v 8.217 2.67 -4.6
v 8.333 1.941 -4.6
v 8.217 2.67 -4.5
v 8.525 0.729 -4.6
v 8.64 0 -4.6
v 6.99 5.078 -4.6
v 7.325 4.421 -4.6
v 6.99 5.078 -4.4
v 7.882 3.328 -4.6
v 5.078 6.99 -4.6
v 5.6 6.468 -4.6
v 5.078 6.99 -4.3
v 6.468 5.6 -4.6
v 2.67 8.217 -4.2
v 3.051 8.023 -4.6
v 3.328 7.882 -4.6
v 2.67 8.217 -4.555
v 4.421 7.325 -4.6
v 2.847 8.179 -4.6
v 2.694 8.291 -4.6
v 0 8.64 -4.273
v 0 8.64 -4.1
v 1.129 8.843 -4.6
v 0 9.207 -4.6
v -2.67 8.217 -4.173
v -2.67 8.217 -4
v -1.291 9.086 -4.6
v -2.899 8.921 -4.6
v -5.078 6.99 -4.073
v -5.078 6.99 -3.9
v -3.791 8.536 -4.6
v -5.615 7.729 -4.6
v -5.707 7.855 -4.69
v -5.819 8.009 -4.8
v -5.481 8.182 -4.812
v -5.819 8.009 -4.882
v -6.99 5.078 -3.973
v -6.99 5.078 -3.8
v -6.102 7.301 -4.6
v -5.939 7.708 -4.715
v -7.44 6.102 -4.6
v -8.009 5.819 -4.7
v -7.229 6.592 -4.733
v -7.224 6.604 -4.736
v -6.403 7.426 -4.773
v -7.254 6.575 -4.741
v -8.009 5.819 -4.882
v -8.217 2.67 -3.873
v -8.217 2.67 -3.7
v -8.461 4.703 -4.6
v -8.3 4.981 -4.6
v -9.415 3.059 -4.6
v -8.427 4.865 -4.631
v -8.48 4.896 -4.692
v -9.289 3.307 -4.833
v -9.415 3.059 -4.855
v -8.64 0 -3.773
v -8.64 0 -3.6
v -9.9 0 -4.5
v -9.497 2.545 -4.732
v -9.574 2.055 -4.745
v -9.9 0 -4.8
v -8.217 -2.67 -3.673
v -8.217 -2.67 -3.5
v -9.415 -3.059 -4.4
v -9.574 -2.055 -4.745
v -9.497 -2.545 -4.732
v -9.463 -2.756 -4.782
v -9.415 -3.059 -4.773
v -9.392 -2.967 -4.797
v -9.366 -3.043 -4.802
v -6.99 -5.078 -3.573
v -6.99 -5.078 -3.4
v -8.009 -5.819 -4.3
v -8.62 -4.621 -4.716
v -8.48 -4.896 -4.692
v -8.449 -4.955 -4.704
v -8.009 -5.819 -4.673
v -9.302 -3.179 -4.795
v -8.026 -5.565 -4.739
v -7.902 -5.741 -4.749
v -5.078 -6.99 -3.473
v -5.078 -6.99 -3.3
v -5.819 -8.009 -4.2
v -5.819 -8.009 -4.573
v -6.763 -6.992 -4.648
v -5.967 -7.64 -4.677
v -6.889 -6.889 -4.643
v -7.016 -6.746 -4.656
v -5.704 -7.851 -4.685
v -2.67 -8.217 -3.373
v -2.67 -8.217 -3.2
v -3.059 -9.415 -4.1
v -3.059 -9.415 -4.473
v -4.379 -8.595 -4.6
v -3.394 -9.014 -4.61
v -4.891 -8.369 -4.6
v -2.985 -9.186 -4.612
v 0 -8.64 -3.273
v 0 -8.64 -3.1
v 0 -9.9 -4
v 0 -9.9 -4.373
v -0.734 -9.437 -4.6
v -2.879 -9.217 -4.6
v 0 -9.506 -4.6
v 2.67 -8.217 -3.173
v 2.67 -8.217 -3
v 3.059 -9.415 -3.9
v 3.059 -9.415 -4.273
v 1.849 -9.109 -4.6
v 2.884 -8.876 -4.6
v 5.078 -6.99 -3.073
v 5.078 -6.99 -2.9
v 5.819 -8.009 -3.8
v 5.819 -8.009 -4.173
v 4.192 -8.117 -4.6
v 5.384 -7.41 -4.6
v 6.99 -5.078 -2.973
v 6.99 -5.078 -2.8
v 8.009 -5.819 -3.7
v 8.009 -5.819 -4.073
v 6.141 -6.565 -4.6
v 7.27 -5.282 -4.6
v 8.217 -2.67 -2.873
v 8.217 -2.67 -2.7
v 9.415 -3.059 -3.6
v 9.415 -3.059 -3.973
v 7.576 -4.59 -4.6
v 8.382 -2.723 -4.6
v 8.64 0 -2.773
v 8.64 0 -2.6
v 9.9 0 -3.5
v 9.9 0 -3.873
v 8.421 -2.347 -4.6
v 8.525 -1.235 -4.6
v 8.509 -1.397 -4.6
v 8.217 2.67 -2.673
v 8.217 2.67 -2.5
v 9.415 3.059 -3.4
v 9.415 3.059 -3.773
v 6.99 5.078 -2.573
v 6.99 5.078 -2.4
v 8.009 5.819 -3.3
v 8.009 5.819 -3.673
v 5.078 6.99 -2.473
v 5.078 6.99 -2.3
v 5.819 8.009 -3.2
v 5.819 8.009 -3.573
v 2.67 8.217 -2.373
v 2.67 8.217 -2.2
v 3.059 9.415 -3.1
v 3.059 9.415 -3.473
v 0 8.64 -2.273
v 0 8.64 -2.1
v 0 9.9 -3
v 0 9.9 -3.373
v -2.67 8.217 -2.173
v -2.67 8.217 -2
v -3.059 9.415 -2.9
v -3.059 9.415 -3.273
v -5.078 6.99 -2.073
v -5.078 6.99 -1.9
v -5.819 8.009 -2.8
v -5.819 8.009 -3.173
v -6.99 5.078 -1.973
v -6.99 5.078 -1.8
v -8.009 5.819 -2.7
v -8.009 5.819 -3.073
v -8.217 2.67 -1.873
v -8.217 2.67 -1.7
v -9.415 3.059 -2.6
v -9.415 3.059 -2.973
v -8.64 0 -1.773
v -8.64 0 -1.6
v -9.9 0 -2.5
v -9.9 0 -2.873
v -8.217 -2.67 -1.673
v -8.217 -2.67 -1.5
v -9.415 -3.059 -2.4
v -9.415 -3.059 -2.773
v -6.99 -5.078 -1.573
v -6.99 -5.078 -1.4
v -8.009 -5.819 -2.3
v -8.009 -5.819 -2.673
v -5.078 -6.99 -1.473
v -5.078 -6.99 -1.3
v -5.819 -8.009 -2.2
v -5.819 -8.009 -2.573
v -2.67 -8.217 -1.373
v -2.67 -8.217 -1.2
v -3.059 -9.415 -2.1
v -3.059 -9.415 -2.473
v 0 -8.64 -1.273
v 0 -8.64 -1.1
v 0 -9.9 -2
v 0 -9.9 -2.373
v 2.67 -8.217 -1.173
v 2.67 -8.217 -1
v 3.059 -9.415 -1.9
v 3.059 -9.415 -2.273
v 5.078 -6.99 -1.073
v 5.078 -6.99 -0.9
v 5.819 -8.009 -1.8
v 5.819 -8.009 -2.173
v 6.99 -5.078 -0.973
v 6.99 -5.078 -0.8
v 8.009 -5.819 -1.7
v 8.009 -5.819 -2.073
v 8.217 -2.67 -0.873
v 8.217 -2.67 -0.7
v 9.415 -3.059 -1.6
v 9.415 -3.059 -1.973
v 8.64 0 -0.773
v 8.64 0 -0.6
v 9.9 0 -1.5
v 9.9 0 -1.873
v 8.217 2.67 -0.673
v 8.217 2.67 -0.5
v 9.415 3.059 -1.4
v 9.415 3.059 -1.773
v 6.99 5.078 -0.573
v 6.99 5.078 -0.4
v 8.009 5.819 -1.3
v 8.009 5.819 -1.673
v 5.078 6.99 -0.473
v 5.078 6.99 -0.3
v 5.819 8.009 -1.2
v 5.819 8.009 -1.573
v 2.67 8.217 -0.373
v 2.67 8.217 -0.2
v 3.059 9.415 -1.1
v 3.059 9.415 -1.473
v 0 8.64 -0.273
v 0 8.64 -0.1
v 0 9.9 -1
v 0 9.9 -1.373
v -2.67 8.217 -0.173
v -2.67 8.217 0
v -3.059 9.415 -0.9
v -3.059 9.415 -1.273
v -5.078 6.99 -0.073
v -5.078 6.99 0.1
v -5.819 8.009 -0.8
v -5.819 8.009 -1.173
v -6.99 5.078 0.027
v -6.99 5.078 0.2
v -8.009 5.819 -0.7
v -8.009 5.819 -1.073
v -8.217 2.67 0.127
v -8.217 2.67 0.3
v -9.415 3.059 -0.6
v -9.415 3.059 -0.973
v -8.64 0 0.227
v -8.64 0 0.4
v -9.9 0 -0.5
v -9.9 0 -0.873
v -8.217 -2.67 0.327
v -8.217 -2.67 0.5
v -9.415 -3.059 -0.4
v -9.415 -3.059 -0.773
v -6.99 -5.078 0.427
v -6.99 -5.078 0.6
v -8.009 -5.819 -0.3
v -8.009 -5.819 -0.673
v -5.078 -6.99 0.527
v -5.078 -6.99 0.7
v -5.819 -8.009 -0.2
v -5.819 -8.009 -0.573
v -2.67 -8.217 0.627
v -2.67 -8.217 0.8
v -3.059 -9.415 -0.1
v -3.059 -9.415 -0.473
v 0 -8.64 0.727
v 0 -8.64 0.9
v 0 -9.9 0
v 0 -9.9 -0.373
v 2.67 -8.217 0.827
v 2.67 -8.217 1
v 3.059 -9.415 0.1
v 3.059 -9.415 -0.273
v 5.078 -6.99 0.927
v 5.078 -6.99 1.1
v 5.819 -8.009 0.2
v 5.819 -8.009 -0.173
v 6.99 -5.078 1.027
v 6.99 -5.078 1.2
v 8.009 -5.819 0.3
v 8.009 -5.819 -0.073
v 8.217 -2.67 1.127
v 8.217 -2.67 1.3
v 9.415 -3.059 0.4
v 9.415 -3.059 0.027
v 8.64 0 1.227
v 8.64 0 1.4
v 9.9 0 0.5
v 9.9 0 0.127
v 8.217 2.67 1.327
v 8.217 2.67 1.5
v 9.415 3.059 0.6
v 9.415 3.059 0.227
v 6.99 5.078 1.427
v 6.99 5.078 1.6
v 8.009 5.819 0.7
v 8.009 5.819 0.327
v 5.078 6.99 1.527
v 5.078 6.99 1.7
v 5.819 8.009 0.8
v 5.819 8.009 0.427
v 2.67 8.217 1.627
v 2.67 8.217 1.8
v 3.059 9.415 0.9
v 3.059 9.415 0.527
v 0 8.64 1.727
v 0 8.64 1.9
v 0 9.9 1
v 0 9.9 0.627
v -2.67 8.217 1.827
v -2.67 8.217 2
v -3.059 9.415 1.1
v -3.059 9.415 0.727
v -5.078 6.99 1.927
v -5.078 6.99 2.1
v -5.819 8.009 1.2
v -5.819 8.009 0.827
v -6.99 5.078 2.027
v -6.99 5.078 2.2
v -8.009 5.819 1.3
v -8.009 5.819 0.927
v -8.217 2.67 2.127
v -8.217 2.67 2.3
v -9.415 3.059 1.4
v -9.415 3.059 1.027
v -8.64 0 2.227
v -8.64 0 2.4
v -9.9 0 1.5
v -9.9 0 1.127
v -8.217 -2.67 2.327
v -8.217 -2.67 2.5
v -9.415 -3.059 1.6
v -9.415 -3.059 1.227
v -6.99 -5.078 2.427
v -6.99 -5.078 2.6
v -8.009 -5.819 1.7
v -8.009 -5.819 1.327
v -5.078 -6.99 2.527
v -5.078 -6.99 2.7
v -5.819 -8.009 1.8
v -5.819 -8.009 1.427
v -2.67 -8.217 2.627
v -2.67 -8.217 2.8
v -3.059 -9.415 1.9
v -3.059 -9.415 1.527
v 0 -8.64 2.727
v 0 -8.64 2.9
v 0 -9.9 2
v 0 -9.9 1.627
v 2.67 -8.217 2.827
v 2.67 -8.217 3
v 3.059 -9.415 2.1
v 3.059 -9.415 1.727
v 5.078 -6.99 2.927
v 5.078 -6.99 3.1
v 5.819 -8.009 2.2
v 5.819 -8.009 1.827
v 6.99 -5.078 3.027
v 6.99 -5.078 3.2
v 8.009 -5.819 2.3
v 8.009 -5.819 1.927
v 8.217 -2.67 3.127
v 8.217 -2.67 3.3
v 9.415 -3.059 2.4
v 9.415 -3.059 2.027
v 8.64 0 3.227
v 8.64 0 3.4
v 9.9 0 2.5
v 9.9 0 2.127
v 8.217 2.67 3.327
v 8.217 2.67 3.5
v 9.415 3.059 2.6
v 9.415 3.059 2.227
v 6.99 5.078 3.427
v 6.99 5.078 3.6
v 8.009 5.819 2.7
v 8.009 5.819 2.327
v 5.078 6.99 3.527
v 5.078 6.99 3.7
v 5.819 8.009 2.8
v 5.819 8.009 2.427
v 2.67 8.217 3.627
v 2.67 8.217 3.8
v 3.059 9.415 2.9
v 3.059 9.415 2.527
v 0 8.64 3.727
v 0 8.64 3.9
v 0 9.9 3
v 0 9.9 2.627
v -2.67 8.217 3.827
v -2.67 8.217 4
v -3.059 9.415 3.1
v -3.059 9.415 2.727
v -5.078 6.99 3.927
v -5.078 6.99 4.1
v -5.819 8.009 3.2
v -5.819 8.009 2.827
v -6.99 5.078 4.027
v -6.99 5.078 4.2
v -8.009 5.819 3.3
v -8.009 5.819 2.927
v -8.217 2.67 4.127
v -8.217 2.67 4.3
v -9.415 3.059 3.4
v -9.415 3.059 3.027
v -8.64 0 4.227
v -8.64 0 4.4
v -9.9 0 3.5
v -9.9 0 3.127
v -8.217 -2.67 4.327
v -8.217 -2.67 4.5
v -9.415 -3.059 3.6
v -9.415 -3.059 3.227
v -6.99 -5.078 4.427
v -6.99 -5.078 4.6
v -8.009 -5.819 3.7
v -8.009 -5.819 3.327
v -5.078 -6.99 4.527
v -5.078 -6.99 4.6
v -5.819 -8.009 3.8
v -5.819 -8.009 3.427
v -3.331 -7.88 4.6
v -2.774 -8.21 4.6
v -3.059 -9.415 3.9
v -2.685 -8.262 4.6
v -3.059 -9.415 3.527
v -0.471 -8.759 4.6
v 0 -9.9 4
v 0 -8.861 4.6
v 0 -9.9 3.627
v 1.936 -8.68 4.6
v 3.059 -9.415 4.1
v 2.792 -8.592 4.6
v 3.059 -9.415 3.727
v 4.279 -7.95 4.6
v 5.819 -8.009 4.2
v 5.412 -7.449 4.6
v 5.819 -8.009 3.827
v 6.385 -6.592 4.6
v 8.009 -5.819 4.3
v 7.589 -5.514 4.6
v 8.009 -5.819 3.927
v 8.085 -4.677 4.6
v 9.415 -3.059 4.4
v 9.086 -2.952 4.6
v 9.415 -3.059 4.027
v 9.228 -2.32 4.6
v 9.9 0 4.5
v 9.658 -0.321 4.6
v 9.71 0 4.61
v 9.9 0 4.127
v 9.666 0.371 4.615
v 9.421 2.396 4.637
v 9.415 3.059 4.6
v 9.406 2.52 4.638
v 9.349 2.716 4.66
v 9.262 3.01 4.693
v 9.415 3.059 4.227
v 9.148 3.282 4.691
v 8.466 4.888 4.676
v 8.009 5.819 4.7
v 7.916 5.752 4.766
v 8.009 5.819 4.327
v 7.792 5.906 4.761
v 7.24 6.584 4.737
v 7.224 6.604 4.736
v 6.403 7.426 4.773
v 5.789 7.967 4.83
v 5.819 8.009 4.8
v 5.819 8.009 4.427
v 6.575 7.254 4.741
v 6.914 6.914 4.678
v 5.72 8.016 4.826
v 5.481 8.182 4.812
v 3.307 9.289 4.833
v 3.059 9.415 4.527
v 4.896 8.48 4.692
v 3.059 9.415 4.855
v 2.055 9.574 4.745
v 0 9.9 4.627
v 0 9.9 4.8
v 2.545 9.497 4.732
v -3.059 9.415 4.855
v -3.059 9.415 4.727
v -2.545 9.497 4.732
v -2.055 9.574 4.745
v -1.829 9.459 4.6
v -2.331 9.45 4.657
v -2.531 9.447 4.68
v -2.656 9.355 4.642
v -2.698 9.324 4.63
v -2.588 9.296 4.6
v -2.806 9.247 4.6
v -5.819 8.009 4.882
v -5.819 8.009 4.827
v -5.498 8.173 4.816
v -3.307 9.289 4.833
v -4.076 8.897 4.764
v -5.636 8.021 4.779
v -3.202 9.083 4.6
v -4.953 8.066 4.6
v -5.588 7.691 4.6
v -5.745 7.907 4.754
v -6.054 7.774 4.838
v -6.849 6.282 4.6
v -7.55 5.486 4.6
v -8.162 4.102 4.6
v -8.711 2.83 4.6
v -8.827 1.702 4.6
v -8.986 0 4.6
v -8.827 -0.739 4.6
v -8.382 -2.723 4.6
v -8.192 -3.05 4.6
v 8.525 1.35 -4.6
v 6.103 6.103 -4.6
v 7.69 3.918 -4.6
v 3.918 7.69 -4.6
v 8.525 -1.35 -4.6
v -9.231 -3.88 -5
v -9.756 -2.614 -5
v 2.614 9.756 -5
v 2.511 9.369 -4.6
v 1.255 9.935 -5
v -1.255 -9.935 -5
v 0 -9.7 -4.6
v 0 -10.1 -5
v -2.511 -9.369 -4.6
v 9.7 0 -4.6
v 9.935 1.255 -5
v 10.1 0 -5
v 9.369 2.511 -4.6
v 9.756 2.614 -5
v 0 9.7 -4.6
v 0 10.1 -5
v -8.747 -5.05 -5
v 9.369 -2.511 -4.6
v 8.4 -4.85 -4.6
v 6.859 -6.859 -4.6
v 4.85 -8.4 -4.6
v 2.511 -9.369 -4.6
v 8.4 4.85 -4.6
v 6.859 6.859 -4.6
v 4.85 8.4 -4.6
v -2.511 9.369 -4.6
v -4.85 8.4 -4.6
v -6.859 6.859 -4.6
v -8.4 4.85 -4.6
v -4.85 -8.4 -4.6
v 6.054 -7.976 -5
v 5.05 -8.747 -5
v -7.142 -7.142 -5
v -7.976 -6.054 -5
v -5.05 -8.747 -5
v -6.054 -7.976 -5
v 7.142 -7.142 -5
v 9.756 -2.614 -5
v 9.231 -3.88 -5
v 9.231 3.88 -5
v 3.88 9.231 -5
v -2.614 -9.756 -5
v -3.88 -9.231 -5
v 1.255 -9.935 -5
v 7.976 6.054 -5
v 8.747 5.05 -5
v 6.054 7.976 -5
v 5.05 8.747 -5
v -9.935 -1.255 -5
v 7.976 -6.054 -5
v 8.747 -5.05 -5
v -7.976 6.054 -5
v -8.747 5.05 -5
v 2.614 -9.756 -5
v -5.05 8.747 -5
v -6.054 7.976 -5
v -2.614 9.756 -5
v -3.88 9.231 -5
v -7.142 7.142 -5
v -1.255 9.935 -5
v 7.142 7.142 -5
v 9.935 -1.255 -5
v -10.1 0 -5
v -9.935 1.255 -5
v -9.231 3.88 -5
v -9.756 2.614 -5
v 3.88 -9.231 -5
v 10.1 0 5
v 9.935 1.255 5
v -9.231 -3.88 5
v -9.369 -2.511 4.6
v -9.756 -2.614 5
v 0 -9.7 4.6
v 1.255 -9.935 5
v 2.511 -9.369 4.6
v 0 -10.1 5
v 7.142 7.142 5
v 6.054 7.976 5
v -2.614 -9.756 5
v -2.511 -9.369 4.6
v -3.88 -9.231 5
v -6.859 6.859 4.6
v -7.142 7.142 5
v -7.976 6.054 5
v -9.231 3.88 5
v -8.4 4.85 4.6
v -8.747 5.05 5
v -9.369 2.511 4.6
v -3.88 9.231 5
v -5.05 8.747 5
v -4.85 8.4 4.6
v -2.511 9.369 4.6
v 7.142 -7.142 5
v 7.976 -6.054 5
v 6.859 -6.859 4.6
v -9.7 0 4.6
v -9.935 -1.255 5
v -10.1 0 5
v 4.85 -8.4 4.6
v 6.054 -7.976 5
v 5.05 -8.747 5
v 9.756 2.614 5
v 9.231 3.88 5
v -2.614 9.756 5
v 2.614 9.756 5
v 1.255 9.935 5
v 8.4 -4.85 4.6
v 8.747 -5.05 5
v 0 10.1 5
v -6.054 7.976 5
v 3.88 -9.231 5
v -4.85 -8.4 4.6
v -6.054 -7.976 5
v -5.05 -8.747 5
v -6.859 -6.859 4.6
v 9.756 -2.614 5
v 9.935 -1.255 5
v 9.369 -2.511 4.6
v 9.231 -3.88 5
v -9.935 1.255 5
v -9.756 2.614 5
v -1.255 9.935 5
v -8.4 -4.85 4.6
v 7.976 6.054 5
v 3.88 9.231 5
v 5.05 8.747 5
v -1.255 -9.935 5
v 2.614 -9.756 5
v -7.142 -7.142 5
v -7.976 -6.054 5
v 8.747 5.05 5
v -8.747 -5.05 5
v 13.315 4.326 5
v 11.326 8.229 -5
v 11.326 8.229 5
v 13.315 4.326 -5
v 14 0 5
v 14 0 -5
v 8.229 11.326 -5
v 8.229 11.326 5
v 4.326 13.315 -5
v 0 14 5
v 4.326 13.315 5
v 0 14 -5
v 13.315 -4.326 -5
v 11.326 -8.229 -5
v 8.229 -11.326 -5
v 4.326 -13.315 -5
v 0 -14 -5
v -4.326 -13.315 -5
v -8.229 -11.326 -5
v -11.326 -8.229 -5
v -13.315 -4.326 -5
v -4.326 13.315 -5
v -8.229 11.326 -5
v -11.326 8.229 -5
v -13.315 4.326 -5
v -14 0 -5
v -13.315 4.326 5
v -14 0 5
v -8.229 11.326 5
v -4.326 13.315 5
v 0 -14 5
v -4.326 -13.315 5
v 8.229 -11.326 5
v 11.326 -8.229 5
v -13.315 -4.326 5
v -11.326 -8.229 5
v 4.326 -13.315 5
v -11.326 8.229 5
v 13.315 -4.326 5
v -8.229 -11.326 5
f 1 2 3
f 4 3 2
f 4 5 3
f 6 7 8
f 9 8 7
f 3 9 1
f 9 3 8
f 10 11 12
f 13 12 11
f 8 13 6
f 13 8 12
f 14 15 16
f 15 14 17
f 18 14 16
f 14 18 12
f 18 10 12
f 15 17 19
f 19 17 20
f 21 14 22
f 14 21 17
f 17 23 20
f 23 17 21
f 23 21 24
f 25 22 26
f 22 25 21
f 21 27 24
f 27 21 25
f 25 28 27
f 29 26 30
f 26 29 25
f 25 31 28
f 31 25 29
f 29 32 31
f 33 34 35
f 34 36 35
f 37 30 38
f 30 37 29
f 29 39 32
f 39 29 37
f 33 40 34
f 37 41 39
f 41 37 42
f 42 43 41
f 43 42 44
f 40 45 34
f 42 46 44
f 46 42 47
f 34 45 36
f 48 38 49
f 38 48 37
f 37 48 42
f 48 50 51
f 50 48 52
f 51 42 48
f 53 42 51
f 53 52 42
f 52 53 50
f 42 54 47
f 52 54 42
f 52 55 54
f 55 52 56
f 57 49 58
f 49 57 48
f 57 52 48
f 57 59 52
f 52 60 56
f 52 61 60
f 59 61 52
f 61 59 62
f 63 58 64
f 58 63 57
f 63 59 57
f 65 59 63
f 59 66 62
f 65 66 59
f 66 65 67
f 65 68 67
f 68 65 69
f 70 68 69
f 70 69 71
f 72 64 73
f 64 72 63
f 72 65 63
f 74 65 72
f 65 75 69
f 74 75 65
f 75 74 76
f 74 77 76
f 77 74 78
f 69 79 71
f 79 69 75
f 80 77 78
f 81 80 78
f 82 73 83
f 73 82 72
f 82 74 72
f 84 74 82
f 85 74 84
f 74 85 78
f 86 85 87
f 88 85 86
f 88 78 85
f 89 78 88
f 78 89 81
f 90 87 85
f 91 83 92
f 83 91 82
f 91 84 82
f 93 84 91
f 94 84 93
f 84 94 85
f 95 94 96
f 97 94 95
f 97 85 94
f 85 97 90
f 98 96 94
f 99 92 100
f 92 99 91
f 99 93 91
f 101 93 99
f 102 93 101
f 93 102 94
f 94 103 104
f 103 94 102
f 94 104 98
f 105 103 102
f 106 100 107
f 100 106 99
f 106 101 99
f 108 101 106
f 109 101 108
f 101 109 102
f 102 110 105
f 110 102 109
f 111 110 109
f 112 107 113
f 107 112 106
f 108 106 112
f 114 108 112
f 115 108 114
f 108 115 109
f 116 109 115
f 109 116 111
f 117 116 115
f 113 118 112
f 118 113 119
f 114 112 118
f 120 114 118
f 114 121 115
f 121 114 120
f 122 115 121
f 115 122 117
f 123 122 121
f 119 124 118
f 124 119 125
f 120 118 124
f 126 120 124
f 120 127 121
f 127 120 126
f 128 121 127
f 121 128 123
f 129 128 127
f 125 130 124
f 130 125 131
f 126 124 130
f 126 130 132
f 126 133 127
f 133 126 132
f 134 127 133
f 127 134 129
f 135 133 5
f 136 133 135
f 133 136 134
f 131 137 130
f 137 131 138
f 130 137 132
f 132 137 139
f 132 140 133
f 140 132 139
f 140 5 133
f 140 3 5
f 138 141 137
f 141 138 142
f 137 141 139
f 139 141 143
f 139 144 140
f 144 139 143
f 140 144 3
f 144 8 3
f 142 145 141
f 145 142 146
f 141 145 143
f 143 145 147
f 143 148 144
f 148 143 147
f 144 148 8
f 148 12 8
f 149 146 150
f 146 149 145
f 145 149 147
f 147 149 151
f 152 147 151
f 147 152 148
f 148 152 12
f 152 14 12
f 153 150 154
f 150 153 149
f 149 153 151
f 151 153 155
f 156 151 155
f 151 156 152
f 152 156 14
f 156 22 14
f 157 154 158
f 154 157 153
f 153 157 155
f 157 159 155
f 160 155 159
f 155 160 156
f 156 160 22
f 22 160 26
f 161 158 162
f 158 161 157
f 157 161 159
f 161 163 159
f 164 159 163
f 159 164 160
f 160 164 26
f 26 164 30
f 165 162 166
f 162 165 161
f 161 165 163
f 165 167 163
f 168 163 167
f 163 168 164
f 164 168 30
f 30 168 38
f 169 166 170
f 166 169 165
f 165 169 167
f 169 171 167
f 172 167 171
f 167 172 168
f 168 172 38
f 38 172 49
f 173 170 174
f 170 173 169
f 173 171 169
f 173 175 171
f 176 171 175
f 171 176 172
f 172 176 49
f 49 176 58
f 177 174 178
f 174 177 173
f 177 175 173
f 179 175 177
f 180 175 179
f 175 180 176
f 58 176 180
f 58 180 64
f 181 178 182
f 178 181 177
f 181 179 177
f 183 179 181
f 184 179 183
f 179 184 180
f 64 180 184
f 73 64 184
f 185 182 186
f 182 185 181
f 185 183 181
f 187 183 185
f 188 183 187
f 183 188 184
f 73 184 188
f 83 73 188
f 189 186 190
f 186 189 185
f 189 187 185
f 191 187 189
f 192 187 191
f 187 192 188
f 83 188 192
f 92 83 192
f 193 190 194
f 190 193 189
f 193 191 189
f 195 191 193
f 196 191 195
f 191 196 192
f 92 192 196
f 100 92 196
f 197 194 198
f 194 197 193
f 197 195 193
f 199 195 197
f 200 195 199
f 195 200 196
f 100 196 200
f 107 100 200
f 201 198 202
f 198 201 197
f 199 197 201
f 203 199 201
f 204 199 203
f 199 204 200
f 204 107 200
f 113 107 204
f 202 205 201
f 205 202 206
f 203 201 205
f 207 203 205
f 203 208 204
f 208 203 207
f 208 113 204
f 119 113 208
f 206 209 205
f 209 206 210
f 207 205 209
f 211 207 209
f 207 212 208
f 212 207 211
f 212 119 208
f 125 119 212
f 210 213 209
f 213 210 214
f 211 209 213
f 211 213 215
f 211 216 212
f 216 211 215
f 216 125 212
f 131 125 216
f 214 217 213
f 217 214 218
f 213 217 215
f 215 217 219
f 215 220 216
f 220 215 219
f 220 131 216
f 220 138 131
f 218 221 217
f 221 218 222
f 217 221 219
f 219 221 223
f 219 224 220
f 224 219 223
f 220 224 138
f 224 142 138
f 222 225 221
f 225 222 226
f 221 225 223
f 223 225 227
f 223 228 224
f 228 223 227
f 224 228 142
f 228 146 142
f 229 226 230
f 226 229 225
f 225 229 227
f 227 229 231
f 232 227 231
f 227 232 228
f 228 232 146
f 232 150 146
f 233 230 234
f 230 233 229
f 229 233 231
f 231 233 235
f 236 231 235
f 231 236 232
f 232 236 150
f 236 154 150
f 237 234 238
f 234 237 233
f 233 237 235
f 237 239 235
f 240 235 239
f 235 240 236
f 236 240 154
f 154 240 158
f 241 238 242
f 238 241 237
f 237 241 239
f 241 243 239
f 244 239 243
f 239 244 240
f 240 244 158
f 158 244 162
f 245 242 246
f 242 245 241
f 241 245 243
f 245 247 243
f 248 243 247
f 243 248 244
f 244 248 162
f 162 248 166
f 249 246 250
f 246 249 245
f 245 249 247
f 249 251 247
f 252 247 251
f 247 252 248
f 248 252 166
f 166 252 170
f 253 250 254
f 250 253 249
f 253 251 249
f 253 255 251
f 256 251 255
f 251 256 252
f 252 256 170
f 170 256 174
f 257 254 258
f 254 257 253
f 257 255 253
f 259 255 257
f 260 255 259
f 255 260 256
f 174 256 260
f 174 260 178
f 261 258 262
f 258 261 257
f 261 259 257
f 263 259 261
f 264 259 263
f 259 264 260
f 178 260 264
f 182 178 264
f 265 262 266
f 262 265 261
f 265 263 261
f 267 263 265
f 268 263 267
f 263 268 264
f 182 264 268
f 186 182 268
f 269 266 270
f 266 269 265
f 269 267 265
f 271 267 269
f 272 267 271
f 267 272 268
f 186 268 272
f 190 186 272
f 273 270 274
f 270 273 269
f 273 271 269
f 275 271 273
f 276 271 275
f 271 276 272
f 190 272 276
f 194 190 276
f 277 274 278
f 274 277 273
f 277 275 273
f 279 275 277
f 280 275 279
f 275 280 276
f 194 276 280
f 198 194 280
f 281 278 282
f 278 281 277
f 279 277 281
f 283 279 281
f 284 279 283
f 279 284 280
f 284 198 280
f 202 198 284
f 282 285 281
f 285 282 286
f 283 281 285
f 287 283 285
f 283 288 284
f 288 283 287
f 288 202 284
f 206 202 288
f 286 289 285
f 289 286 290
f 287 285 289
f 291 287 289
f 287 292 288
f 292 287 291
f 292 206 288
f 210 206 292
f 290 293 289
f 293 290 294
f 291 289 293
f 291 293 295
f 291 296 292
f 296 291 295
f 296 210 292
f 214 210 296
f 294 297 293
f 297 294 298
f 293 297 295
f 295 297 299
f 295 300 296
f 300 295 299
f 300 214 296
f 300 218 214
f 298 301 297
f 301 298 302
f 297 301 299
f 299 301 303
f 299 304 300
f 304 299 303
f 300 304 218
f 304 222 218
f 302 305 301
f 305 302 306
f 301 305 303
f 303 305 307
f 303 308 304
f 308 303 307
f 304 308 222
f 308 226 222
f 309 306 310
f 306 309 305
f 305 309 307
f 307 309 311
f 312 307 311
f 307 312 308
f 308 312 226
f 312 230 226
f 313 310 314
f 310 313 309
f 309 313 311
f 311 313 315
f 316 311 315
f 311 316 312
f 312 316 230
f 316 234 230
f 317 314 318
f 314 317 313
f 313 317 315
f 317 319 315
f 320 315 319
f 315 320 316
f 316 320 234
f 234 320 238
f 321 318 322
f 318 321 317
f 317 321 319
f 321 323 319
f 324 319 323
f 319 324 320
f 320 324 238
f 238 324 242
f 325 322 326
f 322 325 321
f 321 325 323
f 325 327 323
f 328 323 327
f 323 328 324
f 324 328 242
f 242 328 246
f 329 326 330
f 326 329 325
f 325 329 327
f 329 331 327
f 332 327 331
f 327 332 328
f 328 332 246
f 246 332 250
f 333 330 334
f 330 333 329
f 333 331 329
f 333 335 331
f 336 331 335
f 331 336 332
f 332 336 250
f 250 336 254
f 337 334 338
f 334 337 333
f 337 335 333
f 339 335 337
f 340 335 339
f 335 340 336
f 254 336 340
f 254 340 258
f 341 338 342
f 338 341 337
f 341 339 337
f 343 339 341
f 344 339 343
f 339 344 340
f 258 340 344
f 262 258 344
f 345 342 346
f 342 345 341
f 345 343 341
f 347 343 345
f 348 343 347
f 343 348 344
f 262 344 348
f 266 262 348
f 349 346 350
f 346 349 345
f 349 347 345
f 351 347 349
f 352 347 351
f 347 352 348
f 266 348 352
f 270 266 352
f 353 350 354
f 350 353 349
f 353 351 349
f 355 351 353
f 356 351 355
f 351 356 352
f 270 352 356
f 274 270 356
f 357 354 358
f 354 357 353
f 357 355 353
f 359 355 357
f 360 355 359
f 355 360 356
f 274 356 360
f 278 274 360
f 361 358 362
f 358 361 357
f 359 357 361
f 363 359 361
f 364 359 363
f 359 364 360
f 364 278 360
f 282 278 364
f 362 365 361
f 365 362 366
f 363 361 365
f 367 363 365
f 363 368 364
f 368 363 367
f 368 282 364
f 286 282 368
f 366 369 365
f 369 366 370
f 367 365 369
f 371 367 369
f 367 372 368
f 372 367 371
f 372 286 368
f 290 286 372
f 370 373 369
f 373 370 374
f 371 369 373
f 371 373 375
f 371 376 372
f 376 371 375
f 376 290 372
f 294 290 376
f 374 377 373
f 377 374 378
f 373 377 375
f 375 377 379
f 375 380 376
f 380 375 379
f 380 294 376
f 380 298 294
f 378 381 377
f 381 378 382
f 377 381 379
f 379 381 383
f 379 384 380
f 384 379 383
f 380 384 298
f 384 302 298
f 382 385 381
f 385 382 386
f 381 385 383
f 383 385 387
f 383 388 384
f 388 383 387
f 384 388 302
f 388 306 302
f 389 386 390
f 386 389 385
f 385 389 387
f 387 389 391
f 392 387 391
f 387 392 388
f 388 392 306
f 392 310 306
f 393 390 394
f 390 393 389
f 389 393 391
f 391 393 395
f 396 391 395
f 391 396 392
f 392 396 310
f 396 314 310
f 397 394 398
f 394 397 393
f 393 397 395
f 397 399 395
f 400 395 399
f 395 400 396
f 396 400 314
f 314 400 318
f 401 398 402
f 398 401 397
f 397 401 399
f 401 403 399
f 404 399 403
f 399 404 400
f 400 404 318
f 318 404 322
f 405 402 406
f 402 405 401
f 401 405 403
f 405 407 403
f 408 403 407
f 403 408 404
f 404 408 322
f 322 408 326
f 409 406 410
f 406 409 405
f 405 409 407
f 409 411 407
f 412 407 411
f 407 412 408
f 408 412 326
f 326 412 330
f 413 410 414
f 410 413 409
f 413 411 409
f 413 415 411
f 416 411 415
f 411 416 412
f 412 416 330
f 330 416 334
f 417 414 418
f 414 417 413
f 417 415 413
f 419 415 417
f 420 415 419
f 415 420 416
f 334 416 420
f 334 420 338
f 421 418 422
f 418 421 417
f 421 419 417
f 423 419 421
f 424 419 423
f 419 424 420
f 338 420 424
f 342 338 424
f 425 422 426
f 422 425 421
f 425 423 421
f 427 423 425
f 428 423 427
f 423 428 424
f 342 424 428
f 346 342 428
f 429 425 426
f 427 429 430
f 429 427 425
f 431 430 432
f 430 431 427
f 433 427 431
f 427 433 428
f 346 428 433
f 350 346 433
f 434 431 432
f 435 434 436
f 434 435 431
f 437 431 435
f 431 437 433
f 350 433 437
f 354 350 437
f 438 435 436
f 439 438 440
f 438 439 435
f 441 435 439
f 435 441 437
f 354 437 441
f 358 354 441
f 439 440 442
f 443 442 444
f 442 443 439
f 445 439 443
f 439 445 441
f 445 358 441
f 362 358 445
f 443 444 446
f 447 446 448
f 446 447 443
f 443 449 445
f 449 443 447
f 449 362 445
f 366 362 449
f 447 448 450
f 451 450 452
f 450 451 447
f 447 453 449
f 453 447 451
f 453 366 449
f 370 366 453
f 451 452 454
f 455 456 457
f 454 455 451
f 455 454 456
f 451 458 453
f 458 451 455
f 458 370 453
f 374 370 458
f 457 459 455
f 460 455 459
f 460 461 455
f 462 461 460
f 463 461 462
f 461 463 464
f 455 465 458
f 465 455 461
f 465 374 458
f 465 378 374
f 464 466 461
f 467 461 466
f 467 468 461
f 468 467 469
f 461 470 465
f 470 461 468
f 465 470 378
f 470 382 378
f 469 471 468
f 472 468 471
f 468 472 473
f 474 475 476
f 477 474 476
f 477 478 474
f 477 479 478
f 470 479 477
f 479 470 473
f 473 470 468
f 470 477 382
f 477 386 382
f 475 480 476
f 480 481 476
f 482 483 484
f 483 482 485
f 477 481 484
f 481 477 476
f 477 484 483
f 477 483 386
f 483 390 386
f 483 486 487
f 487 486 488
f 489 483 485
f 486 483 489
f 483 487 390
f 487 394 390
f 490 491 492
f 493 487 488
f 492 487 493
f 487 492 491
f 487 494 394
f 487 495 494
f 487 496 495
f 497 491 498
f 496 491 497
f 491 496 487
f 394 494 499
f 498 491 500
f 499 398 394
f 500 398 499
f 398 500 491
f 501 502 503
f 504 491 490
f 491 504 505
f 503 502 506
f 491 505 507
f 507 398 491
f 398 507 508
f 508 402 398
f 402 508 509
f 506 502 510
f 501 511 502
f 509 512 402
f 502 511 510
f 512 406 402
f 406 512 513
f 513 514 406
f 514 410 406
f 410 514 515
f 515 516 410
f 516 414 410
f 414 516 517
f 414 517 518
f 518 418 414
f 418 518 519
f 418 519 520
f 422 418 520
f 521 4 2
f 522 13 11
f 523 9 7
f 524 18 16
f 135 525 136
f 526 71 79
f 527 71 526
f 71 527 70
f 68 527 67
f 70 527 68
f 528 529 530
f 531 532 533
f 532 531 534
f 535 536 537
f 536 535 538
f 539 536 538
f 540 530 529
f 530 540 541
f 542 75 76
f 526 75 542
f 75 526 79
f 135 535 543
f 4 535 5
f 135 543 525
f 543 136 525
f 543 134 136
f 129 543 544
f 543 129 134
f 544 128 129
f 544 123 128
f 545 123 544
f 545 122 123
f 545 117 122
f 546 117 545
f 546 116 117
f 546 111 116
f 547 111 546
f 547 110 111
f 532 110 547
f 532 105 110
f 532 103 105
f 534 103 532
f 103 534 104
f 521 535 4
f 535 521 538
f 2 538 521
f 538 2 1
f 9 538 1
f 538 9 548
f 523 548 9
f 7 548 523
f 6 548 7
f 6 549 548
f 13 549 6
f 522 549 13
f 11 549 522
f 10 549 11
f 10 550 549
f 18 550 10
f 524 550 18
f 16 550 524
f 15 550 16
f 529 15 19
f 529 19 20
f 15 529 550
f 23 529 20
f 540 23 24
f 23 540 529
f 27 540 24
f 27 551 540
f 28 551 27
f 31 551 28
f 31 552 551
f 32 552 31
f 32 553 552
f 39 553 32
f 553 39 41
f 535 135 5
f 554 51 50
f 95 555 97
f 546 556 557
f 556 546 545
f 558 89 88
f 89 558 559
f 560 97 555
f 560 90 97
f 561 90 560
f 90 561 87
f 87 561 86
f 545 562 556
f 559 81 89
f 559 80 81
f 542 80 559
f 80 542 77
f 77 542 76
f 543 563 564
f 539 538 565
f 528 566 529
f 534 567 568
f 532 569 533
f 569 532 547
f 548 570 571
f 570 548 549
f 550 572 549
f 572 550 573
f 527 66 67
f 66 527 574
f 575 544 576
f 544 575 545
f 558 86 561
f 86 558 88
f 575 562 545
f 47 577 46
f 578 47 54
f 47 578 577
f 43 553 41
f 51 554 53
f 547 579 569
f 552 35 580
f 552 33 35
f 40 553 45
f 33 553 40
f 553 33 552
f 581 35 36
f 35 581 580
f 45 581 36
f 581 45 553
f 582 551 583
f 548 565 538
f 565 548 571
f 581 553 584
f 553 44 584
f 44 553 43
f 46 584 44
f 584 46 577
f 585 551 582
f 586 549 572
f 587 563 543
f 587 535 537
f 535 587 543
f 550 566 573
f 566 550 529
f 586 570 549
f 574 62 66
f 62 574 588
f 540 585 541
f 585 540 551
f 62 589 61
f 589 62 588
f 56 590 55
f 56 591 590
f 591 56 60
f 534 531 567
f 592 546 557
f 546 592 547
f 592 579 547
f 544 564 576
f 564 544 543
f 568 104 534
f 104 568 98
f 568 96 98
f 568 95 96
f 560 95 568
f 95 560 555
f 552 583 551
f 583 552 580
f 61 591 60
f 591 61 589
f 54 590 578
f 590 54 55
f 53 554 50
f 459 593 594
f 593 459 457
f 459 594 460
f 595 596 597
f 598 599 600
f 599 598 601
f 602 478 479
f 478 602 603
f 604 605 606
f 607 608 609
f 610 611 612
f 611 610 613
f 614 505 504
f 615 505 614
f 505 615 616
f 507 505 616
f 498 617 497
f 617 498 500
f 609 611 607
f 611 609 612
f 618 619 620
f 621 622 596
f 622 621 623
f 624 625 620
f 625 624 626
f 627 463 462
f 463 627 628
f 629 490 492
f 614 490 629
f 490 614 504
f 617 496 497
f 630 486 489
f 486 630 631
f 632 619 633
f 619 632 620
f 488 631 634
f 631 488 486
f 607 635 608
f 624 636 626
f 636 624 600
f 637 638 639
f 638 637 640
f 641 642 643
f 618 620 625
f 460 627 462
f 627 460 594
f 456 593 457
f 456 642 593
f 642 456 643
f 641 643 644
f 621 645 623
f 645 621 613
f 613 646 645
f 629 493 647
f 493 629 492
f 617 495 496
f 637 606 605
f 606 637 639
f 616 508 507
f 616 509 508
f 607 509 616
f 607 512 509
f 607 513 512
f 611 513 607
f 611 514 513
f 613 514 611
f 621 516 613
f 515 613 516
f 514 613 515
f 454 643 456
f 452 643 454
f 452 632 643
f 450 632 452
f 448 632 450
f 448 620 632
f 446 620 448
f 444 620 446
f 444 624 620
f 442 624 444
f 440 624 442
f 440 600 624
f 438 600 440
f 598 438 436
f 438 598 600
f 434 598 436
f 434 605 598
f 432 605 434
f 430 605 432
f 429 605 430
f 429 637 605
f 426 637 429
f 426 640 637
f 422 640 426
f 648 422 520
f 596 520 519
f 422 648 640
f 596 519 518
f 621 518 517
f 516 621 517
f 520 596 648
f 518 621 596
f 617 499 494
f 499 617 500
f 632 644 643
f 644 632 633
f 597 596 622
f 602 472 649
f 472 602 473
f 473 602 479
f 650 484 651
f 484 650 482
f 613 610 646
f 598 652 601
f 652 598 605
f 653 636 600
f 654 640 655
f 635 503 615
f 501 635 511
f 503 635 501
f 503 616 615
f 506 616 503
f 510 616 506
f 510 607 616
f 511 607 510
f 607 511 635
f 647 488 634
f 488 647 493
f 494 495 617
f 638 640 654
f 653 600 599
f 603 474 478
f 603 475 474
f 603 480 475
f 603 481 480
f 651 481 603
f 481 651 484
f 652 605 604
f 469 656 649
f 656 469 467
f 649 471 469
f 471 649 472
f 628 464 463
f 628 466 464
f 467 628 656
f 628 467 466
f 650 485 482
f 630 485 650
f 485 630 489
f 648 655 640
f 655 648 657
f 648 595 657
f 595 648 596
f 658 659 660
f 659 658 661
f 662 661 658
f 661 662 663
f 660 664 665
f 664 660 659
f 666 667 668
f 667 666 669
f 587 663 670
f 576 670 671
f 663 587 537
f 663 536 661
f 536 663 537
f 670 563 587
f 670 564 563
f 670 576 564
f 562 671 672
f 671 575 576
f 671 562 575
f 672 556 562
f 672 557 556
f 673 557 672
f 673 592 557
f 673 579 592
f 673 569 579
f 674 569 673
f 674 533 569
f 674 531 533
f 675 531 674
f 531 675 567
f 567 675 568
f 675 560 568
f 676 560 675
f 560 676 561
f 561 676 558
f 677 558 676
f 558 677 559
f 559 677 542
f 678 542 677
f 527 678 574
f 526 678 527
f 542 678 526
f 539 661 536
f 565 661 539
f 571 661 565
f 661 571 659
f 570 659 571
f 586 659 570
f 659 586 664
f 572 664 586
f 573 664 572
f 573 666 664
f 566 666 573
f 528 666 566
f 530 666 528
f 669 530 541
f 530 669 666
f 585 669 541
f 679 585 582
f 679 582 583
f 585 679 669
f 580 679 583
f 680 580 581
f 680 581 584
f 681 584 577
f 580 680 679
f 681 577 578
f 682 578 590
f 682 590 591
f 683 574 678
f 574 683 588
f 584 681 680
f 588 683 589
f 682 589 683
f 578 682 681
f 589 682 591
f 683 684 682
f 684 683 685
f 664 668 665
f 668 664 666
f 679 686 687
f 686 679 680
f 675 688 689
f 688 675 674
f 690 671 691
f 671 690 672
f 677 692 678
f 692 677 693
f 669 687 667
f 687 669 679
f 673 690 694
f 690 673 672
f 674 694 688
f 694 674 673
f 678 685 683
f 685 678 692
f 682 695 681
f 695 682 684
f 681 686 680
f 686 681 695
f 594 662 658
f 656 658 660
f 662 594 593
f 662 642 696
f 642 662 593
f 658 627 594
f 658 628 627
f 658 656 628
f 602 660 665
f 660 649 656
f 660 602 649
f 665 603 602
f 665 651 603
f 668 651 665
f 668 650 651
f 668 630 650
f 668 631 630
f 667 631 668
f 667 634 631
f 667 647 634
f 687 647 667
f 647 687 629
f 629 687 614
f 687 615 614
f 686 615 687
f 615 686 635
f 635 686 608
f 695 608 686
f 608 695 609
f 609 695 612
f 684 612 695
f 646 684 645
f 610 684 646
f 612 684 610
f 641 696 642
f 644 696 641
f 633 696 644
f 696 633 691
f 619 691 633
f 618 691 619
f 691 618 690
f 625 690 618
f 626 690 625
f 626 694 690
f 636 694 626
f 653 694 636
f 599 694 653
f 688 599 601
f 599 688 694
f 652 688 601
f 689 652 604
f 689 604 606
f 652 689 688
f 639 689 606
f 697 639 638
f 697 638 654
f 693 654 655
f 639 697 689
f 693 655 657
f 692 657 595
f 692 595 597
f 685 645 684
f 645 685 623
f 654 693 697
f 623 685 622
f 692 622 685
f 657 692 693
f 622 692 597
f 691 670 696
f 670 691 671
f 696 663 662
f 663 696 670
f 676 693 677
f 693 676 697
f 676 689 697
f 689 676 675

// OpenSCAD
// A replacement holder to fit a dremel to
// The little bolt hobbit by elk
// http://www.thingiverse.com/thing:23717
//derived from Router attachment for rotary tool (thing:17105)


// You need the sylwych's thread library. Get it from:
// http://www.thingiverse.com/thing:8793
// or
// https://github.com/syvwlch/Thingiverse-Projects/tree/master/Threaded%20Library
include<Thread_Library.scad>


threadRad=9.0;   // Tweak this so the thread fits snugly on your dremel
nut=5.5;       // 
nutHeight=2.3;
nutHole=3.2;
thickness=10;    // Depth of the top nut
width=40;
baseRad=35;      // Radius at the base
baseDepth=35;    // Distance from bottom of the nut to the base
baseLift=5;      // How much of the base rises vertically before the cone starts / windows are cut out
wallThickness=4; // Thickness of the walls, increase for more strength
holeRad=15;      // Radius of the window corners

offset=2.6;

// Set resolution parameters
$fn=20;
$fa=0.6;
$fs=4;



    // Top nut that attaches to the rotary tool
	difference() 
	{
	union(){
		cylinder(
			h=thickness,
			r=threadRad+wallThickness+1, 
			center=true
			);
	}
	
		
		
	translate([0,0,-5])
		trapezoidThreadNegativeSpace(length=thickness, 
		pitch=2.0, pitchRadius=threadRad, threadHeightToPitch=0.7, stepsPerTurn=20, countersunk=0.2);
	}

	
